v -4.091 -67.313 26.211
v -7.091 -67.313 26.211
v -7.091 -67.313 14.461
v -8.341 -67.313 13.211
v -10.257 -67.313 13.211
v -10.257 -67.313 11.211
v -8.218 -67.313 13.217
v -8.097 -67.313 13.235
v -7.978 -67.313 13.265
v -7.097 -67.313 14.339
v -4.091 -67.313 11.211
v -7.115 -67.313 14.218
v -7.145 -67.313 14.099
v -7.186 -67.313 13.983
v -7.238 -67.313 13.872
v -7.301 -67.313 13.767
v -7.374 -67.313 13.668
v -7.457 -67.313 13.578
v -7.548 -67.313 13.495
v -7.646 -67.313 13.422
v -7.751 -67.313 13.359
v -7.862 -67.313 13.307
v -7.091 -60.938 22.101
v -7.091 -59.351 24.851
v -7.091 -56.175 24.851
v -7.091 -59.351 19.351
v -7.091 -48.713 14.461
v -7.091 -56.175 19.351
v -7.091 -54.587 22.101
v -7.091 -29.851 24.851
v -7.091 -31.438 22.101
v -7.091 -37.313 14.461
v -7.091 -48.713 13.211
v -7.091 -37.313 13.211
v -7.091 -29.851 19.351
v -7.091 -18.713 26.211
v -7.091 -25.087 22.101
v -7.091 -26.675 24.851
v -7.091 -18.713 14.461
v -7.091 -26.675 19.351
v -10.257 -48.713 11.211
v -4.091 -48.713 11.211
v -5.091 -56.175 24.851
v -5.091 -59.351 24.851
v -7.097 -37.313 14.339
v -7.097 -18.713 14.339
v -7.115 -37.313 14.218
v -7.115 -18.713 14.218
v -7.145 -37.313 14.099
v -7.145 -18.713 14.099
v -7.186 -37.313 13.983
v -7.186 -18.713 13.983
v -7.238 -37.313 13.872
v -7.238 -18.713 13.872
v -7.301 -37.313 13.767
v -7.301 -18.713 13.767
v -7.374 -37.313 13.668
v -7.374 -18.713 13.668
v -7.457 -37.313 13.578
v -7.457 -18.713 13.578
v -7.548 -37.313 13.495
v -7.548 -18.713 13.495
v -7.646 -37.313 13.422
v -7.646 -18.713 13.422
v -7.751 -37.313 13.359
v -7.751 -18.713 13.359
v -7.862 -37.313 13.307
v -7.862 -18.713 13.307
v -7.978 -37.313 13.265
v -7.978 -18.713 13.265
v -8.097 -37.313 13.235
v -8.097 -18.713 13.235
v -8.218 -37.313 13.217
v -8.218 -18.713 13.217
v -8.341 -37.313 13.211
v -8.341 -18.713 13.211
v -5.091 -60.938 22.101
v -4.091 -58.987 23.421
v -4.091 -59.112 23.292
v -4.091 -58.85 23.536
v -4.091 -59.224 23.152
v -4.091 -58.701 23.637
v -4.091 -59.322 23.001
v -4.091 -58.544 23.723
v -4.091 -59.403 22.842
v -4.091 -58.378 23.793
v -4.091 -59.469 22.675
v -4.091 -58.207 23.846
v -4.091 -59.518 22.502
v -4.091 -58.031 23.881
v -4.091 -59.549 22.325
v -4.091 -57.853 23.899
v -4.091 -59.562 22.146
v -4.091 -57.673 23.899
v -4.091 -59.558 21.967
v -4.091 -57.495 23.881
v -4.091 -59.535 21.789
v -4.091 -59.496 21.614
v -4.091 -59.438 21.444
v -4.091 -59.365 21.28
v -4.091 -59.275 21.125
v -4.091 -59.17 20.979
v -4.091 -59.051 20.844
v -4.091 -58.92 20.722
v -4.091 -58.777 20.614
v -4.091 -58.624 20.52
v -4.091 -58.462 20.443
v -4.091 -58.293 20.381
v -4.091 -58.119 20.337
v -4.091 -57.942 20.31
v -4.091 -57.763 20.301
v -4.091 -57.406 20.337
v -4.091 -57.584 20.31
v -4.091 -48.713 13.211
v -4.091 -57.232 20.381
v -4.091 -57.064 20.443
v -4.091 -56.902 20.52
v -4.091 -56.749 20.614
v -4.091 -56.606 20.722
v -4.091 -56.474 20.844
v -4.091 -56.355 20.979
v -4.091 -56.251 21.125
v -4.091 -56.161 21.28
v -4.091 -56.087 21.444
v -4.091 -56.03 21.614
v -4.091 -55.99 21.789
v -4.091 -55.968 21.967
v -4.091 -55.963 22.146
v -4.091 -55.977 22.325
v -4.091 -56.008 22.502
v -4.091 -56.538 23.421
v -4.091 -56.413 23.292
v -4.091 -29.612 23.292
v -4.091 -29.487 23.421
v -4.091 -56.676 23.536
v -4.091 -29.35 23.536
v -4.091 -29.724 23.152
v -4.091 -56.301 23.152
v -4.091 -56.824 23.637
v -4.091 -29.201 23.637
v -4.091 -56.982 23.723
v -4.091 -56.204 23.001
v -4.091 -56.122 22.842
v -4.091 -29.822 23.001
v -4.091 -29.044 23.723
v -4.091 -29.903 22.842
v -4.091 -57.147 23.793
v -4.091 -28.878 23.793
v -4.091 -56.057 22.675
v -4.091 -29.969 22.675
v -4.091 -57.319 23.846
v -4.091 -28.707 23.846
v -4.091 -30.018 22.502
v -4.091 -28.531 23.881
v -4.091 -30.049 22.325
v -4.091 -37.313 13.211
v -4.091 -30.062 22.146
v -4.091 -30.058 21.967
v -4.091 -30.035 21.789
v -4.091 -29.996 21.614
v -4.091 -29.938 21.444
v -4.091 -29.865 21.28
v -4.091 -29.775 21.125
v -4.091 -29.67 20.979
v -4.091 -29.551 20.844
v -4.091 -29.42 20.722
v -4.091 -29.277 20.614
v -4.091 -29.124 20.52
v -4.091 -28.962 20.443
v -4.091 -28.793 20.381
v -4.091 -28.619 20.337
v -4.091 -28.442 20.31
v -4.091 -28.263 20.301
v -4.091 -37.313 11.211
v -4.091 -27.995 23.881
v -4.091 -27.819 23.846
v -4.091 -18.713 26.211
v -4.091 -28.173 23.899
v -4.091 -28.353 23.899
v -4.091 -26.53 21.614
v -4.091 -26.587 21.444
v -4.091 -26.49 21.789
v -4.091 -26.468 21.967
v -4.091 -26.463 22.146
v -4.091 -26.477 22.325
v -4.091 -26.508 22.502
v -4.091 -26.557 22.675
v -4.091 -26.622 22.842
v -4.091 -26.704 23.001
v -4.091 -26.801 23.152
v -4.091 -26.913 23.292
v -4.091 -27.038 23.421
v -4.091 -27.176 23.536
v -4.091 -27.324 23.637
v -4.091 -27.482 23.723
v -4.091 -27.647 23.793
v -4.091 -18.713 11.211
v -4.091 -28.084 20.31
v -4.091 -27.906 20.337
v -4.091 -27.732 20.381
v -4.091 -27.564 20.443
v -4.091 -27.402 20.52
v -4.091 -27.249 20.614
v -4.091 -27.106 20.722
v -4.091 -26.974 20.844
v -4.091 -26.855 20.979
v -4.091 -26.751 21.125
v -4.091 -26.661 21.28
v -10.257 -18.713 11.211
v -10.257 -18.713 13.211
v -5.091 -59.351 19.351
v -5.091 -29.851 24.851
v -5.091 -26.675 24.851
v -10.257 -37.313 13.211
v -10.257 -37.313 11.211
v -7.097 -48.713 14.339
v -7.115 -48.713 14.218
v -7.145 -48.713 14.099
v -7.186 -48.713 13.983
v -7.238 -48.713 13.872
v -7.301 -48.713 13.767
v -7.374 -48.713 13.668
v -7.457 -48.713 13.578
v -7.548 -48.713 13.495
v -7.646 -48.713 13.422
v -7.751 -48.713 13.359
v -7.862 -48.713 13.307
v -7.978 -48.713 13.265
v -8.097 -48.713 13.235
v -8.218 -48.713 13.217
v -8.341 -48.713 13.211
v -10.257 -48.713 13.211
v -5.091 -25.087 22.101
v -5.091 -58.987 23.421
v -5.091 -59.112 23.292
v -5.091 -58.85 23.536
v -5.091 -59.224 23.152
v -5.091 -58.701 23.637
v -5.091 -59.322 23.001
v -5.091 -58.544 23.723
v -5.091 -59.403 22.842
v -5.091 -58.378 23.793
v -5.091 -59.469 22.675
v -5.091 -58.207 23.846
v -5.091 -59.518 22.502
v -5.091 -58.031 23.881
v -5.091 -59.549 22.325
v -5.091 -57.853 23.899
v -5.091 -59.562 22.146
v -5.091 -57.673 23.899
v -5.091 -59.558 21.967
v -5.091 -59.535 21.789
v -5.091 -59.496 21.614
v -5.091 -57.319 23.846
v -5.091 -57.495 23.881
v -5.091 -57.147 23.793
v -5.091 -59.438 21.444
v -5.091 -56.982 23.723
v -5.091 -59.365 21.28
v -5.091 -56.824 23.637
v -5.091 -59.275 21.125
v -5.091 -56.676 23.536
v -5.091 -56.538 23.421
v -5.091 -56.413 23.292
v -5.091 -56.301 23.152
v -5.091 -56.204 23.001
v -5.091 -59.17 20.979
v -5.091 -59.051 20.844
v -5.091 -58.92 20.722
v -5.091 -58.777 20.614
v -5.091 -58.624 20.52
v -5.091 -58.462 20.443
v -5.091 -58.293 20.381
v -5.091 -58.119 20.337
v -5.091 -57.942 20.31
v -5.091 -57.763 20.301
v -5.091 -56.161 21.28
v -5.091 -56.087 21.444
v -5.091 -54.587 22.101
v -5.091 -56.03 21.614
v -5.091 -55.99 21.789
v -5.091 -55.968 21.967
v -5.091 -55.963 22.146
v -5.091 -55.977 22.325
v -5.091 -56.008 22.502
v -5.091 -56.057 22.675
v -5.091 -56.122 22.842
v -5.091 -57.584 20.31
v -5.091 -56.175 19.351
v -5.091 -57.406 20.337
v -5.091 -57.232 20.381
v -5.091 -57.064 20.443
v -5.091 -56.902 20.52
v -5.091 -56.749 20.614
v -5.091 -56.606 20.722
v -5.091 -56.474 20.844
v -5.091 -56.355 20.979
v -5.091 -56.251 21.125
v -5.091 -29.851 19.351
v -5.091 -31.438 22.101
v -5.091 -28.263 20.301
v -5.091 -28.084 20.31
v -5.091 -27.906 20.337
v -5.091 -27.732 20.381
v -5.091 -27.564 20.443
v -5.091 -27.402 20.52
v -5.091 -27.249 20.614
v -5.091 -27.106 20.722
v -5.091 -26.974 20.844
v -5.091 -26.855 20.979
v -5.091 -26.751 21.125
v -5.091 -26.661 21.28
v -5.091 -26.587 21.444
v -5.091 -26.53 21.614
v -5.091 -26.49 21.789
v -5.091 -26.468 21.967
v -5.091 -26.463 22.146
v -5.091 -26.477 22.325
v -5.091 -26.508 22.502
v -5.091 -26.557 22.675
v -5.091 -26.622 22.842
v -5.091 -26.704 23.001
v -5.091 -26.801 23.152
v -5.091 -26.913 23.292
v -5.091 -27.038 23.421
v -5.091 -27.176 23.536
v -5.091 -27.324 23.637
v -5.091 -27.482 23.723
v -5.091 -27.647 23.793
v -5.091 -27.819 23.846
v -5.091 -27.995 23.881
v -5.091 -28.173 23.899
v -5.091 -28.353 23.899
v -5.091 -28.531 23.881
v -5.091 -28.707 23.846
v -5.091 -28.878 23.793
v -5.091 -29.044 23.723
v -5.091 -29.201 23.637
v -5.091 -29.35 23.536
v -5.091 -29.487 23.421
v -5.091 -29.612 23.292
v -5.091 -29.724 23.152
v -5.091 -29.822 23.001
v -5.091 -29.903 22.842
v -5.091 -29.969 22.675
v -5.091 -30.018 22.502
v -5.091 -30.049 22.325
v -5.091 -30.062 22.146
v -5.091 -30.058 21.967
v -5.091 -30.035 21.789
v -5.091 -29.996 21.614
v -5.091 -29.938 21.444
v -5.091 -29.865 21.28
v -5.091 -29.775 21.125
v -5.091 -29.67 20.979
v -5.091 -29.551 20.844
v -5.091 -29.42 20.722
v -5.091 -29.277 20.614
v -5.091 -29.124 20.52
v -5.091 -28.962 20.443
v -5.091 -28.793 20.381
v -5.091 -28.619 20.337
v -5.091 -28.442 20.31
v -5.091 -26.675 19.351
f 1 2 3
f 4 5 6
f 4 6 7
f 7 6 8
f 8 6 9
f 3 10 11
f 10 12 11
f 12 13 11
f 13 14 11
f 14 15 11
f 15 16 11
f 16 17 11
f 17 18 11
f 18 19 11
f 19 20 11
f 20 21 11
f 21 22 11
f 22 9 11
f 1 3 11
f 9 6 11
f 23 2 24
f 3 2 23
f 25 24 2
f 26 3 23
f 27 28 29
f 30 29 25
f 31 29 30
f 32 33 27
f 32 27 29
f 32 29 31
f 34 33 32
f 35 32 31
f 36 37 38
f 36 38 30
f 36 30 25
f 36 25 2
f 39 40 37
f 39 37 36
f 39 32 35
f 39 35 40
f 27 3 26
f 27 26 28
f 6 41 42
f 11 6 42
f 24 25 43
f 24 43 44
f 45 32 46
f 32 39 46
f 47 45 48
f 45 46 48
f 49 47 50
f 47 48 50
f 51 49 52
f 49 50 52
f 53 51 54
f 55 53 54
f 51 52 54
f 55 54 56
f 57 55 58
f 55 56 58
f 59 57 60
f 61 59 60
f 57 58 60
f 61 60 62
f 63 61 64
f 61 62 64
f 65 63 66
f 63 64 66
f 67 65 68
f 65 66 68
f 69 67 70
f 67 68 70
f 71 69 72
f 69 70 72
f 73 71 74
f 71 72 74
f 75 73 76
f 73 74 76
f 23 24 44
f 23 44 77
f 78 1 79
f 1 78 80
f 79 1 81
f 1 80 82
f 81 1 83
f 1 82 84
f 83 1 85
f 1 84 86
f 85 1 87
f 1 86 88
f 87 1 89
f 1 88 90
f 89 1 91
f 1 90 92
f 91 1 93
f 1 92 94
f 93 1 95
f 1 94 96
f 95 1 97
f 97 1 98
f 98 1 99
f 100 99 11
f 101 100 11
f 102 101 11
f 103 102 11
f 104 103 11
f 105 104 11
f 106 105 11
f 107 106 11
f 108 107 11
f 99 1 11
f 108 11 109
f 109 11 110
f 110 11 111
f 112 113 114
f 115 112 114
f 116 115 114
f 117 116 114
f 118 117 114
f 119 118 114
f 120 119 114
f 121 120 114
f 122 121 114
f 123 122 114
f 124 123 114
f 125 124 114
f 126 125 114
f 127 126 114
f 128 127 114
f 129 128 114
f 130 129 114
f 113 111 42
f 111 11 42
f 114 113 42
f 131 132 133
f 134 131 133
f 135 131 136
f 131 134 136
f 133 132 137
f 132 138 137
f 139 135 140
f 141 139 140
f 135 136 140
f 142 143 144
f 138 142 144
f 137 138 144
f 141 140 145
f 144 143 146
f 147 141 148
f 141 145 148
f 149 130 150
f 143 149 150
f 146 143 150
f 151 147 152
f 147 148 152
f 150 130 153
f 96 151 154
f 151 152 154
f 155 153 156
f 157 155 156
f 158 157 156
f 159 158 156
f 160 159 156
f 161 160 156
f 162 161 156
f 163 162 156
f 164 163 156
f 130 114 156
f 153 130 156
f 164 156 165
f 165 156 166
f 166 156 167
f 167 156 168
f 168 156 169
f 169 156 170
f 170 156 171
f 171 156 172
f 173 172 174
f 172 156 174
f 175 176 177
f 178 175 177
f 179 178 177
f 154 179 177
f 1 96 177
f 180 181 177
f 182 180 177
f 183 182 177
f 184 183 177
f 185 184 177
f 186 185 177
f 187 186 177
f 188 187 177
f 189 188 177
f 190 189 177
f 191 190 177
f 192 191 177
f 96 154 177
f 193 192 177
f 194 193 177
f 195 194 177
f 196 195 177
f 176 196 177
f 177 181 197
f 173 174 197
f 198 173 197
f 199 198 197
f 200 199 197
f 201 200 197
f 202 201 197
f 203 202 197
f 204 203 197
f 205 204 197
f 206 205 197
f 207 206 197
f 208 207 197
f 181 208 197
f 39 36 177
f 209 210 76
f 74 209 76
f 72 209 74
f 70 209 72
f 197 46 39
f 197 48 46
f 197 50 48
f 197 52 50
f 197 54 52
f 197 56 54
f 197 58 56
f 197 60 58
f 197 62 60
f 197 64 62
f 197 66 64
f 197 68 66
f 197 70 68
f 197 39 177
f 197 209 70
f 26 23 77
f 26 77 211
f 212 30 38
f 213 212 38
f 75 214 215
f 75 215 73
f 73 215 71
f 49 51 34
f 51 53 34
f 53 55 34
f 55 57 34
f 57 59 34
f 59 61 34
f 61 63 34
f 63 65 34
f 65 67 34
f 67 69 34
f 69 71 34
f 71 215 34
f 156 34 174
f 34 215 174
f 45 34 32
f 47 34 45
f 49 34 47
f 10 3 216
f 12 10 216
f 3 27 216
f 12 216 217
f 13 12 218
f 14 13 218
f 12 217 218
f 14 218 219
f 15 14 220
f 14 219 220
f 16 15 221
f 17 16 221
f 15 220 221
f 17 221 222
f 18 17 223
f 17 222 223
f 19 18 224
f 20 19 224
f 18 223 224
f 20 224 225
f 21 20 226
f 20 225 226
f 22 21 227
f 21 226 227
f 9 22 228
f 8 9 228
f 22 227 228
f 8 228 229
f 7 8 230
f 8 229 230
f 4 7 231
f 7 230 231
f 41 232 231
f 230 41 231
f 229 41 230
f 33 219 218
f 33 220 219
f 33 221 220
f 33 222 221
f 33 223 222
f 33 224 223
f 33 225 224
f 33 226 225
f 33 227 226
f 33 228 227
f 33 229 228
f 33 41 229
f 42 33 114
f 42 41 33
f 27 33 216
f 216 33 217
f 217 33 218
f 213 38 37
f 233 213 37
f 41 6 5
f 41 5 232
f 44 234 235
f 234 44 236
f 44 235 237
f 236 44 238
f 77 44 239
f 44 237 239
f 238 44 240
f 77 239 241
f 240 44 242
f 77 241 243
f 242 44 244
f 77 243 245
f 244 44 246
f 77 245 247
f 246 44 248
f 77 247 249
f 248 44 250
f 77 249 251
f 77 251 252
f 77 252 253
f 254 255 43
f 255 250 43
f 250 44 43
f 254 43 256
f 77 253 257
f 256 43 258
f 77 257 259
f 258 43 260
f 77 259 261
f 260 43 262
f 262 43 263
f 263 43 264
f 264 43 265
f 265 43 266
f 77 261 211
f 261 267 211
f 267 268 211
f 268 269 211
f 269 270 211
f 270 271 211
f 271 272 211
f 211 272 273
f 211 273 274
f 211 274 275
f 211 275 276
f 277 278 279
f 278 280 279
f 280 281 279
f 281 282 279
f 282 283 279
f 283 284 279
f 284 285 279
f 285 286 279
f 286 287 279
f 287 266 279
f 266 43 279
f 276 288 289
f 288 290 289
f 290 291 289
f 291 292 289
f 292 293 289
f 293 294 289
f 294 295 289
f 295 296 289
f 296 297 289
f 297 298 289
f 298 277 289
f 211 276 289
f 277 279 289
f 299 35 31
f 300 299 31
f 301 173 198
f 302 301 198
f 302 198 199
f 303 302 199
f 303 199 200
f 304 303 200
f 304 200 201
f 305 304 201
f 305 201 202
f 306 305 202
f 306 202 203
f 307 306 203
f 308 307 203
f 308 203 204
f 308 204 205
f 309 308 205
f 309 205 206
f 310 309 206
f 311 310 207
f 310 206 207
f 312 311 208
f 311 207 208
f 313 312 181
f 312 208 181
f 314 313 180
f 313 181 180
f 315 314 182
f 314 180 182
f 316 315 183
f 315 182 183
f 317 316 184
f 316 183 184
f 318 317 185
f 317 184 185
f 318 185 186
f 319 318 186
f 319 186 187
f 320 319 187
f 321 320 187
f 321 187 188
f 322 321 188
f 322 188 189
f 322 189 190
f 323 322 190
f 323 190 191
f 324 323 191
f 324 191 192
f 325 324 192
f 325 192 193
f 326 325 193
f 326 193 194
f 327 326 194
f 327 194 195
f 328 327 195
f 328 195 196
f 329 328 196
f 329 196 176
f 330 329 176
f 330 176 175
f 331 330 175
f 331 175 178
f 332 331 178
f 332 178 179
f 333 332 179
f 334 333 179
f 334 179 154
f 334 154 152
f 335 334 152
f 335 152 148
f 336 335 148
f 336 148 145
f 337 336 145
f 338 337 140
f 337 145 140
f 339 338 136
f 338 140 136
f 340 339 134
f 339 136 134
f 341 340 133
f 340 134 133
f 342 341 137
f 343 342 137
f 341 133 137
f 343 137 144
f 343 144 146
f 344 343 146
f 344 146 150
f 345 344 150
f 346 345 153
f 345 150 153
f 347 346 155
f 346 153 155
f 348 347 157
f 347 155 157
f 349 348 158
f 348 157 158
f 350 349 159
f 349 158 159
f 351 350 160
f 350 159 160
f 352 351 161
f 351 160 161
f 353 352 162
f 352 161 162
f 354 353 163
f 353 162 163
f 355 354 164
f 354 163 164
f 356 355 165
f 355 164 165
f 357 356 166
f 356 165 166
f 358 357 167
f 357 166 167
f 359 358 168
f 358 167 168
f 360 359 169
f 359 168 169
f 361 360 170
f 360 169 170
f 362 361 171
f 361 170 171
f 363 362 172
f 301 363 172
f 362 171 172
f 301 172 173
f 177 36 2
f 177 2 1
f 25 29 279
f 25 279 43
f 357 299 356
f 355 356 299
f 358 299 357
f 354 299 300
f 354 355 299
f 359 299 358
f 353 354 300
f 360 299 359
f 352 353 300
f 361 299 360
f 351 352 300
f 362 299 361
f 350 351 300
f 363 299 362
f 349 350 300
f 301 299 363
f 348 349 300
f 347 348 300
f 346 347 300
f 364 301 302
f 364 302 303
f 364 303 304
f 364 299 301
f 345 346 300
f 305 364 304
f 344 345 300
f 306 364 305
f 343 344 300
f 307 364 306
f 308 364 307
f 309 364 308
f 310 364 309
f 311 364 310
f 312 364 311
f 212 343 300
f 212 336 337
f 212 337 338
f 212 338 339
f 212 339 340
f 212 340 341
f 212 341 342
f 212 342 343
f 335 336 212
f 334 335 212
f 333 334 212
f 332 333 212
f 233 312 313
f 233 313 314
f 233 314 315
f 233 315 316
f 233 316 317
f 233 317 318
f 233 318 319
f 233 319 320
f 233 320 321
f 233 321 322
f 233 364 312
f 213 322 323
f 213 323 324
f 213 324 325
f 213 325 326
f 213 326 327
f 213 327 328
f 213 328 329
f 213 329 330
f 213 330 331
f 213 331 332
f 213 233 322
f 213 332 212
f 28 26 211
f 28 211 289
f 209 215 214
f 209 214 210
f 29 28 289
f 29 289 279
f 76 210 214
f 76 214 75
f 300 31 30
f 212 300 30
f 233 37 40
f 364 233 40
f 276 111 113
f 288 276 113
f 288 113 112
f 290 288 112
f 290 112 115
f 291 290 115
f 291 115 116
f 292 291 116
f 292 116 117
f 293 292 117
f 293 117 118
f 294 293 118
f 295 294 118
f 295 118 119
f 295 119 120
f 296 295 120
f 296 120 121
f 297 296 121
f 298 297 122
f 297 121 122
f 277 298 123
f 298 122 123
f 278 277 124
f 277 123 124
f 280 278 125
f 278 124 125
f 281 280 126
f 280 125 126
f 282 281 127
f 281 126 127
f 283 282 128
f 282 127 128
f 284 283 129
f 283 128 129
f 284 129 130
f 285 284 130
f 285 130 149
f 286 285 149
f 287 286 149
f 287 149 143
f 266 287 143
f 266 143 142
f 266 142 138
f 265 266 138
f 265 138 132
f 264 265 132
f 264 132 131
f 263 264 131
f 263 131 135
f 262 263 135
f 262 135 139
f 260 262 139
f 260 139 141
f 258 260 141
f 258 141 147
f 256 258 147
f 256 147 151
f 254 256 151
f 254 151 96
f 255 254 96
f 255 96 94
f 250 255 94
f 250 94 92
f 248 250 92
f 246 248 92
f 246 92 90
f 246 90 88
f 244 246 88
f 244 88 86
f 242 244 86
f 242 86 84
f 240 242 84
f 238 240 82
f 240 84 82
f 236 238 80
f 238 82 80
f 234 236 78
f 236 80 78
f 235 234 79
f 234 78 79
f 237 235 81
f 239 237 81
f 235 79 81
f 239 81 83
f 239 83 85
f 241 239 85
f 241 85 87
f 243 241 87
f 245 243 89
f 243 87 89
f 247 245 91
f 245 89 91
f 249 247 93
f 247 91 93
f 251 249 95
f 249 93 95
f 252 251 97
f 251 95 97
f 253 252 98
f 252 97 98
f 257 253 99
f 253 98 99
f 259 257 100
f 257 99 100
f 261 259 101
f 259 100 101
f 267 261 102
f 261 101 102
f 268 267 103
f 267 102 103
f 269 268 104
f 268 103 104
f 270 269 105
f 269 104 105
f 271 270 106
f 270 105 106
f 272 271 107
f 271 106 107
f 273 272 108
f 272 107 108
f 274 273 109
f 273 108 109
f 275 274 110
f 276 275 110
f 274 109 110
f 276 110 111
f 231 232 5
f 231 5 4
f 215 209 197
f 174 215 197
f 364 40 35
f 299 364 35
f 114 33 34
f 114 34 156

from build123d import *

# Parameters (mm, degrees)
SKETCH2_W             = 6.16625
SKETCH2_H             = 18.6
BOSS_EXTRUDE1_DEPTH   = 2
BOSS_EXTRUDE1_2_DEPTH = 2
SKETCH3_W             = 3
SKETCH3_H             = 48.6
BOSS_EXTRUDE2_DEPTH   = 13
FILLET1_R             = 1.25
CUT_EXTRUDE1_DEPTH    = 2
M3_CLEARANCE_HOLE1_D  = 3.6


with BuildPart() as part:
    # Sketch2 → Boss-Extrude1 (new body)
    with BuildSketch(Plane.XY.offset(11.211435671)):
        with Locations((-7.173848327, -28.012787822)):
            Rectangle(SKETCH2_W, SKETCH2_H)
    extrude(amount=BOSS_EXTRUDE1_DEPTH)



with BuildPart() as body_2:
    # Sketch2 → Boss-Extrude1 2 (new body)
    with BuildSketch(Plane.XY.offset(11.211435671)):
        with Locations((-7.173848327, -58.012787822)):
            Rectangle(SKETCH2_W, SKETCH2_H)
    extrude(amount=BOSS_EXTRUDE1_2_DEPTH)


with BuildPart() as part_1:
    add(part.part)

    add(body_2.part)  # Boss-Extrude2 merges body 2
    # Sketch3 → Boss-Extrude2 (add)
    with BuildSketch(Plane.XY.offset(13.211435671)):
        with Locations((-5.590723327, -43.012787822)):
            Rectangle(SKETCH3_W, SKETCH3_H)
    extrude(amount=BOSS_EXTRUDE2_DEPTH)

    # Fillet1
    fillet1_edges = [part_1.edges().sort_by_distance(p)[0] for p in [
        (-7.090723327, -58.012787822, 13.211435671),
        (-7.090723327, -28.012787822, 13.211435671),
    ]]
    fillet(fillet1_edges, radius=FILLET1_R)

    # Sketch4 → Cut-Extrude1 (cut)
    with BuildSketch(Plane(origin=(-7.090723327, 0, 0), x_dir=(0, 0, -1), z_dir=(1, 0, 0))):
        Polygon((-19.351262419, -29.850501062), (-22.101262419, -31.438214302), (-24.851262419, -29.850501062), (-24.851262419, -26.675074581), (-22.101262419, -25.087361341), (-19.351262419, -26.675074581), align=None)
        Polygon((-22.101262419, -60.938214302), (-19.351262419, -59.350501062), (-19.351262419, -56.175074581), (-22.101262419, -54.587361341), (-24.851262419, -56.175074581), (-24.851262419, -59.350501062), align=None)
    extrude(amount=CUT_EXTRUDE1_DEPTH, mode=Mode.SUBTRACT)

    # M3 Clearance Hole1 (through all)
    with Locations(Plane.ZY.offset(7.090723327)):
        with Locations((22.101262419, -57.762787822), (22.101262419, -28.262787822)):
            Hole(M3_CLEARANCE_HOLE1_D / 2)


solid = part_1.part
